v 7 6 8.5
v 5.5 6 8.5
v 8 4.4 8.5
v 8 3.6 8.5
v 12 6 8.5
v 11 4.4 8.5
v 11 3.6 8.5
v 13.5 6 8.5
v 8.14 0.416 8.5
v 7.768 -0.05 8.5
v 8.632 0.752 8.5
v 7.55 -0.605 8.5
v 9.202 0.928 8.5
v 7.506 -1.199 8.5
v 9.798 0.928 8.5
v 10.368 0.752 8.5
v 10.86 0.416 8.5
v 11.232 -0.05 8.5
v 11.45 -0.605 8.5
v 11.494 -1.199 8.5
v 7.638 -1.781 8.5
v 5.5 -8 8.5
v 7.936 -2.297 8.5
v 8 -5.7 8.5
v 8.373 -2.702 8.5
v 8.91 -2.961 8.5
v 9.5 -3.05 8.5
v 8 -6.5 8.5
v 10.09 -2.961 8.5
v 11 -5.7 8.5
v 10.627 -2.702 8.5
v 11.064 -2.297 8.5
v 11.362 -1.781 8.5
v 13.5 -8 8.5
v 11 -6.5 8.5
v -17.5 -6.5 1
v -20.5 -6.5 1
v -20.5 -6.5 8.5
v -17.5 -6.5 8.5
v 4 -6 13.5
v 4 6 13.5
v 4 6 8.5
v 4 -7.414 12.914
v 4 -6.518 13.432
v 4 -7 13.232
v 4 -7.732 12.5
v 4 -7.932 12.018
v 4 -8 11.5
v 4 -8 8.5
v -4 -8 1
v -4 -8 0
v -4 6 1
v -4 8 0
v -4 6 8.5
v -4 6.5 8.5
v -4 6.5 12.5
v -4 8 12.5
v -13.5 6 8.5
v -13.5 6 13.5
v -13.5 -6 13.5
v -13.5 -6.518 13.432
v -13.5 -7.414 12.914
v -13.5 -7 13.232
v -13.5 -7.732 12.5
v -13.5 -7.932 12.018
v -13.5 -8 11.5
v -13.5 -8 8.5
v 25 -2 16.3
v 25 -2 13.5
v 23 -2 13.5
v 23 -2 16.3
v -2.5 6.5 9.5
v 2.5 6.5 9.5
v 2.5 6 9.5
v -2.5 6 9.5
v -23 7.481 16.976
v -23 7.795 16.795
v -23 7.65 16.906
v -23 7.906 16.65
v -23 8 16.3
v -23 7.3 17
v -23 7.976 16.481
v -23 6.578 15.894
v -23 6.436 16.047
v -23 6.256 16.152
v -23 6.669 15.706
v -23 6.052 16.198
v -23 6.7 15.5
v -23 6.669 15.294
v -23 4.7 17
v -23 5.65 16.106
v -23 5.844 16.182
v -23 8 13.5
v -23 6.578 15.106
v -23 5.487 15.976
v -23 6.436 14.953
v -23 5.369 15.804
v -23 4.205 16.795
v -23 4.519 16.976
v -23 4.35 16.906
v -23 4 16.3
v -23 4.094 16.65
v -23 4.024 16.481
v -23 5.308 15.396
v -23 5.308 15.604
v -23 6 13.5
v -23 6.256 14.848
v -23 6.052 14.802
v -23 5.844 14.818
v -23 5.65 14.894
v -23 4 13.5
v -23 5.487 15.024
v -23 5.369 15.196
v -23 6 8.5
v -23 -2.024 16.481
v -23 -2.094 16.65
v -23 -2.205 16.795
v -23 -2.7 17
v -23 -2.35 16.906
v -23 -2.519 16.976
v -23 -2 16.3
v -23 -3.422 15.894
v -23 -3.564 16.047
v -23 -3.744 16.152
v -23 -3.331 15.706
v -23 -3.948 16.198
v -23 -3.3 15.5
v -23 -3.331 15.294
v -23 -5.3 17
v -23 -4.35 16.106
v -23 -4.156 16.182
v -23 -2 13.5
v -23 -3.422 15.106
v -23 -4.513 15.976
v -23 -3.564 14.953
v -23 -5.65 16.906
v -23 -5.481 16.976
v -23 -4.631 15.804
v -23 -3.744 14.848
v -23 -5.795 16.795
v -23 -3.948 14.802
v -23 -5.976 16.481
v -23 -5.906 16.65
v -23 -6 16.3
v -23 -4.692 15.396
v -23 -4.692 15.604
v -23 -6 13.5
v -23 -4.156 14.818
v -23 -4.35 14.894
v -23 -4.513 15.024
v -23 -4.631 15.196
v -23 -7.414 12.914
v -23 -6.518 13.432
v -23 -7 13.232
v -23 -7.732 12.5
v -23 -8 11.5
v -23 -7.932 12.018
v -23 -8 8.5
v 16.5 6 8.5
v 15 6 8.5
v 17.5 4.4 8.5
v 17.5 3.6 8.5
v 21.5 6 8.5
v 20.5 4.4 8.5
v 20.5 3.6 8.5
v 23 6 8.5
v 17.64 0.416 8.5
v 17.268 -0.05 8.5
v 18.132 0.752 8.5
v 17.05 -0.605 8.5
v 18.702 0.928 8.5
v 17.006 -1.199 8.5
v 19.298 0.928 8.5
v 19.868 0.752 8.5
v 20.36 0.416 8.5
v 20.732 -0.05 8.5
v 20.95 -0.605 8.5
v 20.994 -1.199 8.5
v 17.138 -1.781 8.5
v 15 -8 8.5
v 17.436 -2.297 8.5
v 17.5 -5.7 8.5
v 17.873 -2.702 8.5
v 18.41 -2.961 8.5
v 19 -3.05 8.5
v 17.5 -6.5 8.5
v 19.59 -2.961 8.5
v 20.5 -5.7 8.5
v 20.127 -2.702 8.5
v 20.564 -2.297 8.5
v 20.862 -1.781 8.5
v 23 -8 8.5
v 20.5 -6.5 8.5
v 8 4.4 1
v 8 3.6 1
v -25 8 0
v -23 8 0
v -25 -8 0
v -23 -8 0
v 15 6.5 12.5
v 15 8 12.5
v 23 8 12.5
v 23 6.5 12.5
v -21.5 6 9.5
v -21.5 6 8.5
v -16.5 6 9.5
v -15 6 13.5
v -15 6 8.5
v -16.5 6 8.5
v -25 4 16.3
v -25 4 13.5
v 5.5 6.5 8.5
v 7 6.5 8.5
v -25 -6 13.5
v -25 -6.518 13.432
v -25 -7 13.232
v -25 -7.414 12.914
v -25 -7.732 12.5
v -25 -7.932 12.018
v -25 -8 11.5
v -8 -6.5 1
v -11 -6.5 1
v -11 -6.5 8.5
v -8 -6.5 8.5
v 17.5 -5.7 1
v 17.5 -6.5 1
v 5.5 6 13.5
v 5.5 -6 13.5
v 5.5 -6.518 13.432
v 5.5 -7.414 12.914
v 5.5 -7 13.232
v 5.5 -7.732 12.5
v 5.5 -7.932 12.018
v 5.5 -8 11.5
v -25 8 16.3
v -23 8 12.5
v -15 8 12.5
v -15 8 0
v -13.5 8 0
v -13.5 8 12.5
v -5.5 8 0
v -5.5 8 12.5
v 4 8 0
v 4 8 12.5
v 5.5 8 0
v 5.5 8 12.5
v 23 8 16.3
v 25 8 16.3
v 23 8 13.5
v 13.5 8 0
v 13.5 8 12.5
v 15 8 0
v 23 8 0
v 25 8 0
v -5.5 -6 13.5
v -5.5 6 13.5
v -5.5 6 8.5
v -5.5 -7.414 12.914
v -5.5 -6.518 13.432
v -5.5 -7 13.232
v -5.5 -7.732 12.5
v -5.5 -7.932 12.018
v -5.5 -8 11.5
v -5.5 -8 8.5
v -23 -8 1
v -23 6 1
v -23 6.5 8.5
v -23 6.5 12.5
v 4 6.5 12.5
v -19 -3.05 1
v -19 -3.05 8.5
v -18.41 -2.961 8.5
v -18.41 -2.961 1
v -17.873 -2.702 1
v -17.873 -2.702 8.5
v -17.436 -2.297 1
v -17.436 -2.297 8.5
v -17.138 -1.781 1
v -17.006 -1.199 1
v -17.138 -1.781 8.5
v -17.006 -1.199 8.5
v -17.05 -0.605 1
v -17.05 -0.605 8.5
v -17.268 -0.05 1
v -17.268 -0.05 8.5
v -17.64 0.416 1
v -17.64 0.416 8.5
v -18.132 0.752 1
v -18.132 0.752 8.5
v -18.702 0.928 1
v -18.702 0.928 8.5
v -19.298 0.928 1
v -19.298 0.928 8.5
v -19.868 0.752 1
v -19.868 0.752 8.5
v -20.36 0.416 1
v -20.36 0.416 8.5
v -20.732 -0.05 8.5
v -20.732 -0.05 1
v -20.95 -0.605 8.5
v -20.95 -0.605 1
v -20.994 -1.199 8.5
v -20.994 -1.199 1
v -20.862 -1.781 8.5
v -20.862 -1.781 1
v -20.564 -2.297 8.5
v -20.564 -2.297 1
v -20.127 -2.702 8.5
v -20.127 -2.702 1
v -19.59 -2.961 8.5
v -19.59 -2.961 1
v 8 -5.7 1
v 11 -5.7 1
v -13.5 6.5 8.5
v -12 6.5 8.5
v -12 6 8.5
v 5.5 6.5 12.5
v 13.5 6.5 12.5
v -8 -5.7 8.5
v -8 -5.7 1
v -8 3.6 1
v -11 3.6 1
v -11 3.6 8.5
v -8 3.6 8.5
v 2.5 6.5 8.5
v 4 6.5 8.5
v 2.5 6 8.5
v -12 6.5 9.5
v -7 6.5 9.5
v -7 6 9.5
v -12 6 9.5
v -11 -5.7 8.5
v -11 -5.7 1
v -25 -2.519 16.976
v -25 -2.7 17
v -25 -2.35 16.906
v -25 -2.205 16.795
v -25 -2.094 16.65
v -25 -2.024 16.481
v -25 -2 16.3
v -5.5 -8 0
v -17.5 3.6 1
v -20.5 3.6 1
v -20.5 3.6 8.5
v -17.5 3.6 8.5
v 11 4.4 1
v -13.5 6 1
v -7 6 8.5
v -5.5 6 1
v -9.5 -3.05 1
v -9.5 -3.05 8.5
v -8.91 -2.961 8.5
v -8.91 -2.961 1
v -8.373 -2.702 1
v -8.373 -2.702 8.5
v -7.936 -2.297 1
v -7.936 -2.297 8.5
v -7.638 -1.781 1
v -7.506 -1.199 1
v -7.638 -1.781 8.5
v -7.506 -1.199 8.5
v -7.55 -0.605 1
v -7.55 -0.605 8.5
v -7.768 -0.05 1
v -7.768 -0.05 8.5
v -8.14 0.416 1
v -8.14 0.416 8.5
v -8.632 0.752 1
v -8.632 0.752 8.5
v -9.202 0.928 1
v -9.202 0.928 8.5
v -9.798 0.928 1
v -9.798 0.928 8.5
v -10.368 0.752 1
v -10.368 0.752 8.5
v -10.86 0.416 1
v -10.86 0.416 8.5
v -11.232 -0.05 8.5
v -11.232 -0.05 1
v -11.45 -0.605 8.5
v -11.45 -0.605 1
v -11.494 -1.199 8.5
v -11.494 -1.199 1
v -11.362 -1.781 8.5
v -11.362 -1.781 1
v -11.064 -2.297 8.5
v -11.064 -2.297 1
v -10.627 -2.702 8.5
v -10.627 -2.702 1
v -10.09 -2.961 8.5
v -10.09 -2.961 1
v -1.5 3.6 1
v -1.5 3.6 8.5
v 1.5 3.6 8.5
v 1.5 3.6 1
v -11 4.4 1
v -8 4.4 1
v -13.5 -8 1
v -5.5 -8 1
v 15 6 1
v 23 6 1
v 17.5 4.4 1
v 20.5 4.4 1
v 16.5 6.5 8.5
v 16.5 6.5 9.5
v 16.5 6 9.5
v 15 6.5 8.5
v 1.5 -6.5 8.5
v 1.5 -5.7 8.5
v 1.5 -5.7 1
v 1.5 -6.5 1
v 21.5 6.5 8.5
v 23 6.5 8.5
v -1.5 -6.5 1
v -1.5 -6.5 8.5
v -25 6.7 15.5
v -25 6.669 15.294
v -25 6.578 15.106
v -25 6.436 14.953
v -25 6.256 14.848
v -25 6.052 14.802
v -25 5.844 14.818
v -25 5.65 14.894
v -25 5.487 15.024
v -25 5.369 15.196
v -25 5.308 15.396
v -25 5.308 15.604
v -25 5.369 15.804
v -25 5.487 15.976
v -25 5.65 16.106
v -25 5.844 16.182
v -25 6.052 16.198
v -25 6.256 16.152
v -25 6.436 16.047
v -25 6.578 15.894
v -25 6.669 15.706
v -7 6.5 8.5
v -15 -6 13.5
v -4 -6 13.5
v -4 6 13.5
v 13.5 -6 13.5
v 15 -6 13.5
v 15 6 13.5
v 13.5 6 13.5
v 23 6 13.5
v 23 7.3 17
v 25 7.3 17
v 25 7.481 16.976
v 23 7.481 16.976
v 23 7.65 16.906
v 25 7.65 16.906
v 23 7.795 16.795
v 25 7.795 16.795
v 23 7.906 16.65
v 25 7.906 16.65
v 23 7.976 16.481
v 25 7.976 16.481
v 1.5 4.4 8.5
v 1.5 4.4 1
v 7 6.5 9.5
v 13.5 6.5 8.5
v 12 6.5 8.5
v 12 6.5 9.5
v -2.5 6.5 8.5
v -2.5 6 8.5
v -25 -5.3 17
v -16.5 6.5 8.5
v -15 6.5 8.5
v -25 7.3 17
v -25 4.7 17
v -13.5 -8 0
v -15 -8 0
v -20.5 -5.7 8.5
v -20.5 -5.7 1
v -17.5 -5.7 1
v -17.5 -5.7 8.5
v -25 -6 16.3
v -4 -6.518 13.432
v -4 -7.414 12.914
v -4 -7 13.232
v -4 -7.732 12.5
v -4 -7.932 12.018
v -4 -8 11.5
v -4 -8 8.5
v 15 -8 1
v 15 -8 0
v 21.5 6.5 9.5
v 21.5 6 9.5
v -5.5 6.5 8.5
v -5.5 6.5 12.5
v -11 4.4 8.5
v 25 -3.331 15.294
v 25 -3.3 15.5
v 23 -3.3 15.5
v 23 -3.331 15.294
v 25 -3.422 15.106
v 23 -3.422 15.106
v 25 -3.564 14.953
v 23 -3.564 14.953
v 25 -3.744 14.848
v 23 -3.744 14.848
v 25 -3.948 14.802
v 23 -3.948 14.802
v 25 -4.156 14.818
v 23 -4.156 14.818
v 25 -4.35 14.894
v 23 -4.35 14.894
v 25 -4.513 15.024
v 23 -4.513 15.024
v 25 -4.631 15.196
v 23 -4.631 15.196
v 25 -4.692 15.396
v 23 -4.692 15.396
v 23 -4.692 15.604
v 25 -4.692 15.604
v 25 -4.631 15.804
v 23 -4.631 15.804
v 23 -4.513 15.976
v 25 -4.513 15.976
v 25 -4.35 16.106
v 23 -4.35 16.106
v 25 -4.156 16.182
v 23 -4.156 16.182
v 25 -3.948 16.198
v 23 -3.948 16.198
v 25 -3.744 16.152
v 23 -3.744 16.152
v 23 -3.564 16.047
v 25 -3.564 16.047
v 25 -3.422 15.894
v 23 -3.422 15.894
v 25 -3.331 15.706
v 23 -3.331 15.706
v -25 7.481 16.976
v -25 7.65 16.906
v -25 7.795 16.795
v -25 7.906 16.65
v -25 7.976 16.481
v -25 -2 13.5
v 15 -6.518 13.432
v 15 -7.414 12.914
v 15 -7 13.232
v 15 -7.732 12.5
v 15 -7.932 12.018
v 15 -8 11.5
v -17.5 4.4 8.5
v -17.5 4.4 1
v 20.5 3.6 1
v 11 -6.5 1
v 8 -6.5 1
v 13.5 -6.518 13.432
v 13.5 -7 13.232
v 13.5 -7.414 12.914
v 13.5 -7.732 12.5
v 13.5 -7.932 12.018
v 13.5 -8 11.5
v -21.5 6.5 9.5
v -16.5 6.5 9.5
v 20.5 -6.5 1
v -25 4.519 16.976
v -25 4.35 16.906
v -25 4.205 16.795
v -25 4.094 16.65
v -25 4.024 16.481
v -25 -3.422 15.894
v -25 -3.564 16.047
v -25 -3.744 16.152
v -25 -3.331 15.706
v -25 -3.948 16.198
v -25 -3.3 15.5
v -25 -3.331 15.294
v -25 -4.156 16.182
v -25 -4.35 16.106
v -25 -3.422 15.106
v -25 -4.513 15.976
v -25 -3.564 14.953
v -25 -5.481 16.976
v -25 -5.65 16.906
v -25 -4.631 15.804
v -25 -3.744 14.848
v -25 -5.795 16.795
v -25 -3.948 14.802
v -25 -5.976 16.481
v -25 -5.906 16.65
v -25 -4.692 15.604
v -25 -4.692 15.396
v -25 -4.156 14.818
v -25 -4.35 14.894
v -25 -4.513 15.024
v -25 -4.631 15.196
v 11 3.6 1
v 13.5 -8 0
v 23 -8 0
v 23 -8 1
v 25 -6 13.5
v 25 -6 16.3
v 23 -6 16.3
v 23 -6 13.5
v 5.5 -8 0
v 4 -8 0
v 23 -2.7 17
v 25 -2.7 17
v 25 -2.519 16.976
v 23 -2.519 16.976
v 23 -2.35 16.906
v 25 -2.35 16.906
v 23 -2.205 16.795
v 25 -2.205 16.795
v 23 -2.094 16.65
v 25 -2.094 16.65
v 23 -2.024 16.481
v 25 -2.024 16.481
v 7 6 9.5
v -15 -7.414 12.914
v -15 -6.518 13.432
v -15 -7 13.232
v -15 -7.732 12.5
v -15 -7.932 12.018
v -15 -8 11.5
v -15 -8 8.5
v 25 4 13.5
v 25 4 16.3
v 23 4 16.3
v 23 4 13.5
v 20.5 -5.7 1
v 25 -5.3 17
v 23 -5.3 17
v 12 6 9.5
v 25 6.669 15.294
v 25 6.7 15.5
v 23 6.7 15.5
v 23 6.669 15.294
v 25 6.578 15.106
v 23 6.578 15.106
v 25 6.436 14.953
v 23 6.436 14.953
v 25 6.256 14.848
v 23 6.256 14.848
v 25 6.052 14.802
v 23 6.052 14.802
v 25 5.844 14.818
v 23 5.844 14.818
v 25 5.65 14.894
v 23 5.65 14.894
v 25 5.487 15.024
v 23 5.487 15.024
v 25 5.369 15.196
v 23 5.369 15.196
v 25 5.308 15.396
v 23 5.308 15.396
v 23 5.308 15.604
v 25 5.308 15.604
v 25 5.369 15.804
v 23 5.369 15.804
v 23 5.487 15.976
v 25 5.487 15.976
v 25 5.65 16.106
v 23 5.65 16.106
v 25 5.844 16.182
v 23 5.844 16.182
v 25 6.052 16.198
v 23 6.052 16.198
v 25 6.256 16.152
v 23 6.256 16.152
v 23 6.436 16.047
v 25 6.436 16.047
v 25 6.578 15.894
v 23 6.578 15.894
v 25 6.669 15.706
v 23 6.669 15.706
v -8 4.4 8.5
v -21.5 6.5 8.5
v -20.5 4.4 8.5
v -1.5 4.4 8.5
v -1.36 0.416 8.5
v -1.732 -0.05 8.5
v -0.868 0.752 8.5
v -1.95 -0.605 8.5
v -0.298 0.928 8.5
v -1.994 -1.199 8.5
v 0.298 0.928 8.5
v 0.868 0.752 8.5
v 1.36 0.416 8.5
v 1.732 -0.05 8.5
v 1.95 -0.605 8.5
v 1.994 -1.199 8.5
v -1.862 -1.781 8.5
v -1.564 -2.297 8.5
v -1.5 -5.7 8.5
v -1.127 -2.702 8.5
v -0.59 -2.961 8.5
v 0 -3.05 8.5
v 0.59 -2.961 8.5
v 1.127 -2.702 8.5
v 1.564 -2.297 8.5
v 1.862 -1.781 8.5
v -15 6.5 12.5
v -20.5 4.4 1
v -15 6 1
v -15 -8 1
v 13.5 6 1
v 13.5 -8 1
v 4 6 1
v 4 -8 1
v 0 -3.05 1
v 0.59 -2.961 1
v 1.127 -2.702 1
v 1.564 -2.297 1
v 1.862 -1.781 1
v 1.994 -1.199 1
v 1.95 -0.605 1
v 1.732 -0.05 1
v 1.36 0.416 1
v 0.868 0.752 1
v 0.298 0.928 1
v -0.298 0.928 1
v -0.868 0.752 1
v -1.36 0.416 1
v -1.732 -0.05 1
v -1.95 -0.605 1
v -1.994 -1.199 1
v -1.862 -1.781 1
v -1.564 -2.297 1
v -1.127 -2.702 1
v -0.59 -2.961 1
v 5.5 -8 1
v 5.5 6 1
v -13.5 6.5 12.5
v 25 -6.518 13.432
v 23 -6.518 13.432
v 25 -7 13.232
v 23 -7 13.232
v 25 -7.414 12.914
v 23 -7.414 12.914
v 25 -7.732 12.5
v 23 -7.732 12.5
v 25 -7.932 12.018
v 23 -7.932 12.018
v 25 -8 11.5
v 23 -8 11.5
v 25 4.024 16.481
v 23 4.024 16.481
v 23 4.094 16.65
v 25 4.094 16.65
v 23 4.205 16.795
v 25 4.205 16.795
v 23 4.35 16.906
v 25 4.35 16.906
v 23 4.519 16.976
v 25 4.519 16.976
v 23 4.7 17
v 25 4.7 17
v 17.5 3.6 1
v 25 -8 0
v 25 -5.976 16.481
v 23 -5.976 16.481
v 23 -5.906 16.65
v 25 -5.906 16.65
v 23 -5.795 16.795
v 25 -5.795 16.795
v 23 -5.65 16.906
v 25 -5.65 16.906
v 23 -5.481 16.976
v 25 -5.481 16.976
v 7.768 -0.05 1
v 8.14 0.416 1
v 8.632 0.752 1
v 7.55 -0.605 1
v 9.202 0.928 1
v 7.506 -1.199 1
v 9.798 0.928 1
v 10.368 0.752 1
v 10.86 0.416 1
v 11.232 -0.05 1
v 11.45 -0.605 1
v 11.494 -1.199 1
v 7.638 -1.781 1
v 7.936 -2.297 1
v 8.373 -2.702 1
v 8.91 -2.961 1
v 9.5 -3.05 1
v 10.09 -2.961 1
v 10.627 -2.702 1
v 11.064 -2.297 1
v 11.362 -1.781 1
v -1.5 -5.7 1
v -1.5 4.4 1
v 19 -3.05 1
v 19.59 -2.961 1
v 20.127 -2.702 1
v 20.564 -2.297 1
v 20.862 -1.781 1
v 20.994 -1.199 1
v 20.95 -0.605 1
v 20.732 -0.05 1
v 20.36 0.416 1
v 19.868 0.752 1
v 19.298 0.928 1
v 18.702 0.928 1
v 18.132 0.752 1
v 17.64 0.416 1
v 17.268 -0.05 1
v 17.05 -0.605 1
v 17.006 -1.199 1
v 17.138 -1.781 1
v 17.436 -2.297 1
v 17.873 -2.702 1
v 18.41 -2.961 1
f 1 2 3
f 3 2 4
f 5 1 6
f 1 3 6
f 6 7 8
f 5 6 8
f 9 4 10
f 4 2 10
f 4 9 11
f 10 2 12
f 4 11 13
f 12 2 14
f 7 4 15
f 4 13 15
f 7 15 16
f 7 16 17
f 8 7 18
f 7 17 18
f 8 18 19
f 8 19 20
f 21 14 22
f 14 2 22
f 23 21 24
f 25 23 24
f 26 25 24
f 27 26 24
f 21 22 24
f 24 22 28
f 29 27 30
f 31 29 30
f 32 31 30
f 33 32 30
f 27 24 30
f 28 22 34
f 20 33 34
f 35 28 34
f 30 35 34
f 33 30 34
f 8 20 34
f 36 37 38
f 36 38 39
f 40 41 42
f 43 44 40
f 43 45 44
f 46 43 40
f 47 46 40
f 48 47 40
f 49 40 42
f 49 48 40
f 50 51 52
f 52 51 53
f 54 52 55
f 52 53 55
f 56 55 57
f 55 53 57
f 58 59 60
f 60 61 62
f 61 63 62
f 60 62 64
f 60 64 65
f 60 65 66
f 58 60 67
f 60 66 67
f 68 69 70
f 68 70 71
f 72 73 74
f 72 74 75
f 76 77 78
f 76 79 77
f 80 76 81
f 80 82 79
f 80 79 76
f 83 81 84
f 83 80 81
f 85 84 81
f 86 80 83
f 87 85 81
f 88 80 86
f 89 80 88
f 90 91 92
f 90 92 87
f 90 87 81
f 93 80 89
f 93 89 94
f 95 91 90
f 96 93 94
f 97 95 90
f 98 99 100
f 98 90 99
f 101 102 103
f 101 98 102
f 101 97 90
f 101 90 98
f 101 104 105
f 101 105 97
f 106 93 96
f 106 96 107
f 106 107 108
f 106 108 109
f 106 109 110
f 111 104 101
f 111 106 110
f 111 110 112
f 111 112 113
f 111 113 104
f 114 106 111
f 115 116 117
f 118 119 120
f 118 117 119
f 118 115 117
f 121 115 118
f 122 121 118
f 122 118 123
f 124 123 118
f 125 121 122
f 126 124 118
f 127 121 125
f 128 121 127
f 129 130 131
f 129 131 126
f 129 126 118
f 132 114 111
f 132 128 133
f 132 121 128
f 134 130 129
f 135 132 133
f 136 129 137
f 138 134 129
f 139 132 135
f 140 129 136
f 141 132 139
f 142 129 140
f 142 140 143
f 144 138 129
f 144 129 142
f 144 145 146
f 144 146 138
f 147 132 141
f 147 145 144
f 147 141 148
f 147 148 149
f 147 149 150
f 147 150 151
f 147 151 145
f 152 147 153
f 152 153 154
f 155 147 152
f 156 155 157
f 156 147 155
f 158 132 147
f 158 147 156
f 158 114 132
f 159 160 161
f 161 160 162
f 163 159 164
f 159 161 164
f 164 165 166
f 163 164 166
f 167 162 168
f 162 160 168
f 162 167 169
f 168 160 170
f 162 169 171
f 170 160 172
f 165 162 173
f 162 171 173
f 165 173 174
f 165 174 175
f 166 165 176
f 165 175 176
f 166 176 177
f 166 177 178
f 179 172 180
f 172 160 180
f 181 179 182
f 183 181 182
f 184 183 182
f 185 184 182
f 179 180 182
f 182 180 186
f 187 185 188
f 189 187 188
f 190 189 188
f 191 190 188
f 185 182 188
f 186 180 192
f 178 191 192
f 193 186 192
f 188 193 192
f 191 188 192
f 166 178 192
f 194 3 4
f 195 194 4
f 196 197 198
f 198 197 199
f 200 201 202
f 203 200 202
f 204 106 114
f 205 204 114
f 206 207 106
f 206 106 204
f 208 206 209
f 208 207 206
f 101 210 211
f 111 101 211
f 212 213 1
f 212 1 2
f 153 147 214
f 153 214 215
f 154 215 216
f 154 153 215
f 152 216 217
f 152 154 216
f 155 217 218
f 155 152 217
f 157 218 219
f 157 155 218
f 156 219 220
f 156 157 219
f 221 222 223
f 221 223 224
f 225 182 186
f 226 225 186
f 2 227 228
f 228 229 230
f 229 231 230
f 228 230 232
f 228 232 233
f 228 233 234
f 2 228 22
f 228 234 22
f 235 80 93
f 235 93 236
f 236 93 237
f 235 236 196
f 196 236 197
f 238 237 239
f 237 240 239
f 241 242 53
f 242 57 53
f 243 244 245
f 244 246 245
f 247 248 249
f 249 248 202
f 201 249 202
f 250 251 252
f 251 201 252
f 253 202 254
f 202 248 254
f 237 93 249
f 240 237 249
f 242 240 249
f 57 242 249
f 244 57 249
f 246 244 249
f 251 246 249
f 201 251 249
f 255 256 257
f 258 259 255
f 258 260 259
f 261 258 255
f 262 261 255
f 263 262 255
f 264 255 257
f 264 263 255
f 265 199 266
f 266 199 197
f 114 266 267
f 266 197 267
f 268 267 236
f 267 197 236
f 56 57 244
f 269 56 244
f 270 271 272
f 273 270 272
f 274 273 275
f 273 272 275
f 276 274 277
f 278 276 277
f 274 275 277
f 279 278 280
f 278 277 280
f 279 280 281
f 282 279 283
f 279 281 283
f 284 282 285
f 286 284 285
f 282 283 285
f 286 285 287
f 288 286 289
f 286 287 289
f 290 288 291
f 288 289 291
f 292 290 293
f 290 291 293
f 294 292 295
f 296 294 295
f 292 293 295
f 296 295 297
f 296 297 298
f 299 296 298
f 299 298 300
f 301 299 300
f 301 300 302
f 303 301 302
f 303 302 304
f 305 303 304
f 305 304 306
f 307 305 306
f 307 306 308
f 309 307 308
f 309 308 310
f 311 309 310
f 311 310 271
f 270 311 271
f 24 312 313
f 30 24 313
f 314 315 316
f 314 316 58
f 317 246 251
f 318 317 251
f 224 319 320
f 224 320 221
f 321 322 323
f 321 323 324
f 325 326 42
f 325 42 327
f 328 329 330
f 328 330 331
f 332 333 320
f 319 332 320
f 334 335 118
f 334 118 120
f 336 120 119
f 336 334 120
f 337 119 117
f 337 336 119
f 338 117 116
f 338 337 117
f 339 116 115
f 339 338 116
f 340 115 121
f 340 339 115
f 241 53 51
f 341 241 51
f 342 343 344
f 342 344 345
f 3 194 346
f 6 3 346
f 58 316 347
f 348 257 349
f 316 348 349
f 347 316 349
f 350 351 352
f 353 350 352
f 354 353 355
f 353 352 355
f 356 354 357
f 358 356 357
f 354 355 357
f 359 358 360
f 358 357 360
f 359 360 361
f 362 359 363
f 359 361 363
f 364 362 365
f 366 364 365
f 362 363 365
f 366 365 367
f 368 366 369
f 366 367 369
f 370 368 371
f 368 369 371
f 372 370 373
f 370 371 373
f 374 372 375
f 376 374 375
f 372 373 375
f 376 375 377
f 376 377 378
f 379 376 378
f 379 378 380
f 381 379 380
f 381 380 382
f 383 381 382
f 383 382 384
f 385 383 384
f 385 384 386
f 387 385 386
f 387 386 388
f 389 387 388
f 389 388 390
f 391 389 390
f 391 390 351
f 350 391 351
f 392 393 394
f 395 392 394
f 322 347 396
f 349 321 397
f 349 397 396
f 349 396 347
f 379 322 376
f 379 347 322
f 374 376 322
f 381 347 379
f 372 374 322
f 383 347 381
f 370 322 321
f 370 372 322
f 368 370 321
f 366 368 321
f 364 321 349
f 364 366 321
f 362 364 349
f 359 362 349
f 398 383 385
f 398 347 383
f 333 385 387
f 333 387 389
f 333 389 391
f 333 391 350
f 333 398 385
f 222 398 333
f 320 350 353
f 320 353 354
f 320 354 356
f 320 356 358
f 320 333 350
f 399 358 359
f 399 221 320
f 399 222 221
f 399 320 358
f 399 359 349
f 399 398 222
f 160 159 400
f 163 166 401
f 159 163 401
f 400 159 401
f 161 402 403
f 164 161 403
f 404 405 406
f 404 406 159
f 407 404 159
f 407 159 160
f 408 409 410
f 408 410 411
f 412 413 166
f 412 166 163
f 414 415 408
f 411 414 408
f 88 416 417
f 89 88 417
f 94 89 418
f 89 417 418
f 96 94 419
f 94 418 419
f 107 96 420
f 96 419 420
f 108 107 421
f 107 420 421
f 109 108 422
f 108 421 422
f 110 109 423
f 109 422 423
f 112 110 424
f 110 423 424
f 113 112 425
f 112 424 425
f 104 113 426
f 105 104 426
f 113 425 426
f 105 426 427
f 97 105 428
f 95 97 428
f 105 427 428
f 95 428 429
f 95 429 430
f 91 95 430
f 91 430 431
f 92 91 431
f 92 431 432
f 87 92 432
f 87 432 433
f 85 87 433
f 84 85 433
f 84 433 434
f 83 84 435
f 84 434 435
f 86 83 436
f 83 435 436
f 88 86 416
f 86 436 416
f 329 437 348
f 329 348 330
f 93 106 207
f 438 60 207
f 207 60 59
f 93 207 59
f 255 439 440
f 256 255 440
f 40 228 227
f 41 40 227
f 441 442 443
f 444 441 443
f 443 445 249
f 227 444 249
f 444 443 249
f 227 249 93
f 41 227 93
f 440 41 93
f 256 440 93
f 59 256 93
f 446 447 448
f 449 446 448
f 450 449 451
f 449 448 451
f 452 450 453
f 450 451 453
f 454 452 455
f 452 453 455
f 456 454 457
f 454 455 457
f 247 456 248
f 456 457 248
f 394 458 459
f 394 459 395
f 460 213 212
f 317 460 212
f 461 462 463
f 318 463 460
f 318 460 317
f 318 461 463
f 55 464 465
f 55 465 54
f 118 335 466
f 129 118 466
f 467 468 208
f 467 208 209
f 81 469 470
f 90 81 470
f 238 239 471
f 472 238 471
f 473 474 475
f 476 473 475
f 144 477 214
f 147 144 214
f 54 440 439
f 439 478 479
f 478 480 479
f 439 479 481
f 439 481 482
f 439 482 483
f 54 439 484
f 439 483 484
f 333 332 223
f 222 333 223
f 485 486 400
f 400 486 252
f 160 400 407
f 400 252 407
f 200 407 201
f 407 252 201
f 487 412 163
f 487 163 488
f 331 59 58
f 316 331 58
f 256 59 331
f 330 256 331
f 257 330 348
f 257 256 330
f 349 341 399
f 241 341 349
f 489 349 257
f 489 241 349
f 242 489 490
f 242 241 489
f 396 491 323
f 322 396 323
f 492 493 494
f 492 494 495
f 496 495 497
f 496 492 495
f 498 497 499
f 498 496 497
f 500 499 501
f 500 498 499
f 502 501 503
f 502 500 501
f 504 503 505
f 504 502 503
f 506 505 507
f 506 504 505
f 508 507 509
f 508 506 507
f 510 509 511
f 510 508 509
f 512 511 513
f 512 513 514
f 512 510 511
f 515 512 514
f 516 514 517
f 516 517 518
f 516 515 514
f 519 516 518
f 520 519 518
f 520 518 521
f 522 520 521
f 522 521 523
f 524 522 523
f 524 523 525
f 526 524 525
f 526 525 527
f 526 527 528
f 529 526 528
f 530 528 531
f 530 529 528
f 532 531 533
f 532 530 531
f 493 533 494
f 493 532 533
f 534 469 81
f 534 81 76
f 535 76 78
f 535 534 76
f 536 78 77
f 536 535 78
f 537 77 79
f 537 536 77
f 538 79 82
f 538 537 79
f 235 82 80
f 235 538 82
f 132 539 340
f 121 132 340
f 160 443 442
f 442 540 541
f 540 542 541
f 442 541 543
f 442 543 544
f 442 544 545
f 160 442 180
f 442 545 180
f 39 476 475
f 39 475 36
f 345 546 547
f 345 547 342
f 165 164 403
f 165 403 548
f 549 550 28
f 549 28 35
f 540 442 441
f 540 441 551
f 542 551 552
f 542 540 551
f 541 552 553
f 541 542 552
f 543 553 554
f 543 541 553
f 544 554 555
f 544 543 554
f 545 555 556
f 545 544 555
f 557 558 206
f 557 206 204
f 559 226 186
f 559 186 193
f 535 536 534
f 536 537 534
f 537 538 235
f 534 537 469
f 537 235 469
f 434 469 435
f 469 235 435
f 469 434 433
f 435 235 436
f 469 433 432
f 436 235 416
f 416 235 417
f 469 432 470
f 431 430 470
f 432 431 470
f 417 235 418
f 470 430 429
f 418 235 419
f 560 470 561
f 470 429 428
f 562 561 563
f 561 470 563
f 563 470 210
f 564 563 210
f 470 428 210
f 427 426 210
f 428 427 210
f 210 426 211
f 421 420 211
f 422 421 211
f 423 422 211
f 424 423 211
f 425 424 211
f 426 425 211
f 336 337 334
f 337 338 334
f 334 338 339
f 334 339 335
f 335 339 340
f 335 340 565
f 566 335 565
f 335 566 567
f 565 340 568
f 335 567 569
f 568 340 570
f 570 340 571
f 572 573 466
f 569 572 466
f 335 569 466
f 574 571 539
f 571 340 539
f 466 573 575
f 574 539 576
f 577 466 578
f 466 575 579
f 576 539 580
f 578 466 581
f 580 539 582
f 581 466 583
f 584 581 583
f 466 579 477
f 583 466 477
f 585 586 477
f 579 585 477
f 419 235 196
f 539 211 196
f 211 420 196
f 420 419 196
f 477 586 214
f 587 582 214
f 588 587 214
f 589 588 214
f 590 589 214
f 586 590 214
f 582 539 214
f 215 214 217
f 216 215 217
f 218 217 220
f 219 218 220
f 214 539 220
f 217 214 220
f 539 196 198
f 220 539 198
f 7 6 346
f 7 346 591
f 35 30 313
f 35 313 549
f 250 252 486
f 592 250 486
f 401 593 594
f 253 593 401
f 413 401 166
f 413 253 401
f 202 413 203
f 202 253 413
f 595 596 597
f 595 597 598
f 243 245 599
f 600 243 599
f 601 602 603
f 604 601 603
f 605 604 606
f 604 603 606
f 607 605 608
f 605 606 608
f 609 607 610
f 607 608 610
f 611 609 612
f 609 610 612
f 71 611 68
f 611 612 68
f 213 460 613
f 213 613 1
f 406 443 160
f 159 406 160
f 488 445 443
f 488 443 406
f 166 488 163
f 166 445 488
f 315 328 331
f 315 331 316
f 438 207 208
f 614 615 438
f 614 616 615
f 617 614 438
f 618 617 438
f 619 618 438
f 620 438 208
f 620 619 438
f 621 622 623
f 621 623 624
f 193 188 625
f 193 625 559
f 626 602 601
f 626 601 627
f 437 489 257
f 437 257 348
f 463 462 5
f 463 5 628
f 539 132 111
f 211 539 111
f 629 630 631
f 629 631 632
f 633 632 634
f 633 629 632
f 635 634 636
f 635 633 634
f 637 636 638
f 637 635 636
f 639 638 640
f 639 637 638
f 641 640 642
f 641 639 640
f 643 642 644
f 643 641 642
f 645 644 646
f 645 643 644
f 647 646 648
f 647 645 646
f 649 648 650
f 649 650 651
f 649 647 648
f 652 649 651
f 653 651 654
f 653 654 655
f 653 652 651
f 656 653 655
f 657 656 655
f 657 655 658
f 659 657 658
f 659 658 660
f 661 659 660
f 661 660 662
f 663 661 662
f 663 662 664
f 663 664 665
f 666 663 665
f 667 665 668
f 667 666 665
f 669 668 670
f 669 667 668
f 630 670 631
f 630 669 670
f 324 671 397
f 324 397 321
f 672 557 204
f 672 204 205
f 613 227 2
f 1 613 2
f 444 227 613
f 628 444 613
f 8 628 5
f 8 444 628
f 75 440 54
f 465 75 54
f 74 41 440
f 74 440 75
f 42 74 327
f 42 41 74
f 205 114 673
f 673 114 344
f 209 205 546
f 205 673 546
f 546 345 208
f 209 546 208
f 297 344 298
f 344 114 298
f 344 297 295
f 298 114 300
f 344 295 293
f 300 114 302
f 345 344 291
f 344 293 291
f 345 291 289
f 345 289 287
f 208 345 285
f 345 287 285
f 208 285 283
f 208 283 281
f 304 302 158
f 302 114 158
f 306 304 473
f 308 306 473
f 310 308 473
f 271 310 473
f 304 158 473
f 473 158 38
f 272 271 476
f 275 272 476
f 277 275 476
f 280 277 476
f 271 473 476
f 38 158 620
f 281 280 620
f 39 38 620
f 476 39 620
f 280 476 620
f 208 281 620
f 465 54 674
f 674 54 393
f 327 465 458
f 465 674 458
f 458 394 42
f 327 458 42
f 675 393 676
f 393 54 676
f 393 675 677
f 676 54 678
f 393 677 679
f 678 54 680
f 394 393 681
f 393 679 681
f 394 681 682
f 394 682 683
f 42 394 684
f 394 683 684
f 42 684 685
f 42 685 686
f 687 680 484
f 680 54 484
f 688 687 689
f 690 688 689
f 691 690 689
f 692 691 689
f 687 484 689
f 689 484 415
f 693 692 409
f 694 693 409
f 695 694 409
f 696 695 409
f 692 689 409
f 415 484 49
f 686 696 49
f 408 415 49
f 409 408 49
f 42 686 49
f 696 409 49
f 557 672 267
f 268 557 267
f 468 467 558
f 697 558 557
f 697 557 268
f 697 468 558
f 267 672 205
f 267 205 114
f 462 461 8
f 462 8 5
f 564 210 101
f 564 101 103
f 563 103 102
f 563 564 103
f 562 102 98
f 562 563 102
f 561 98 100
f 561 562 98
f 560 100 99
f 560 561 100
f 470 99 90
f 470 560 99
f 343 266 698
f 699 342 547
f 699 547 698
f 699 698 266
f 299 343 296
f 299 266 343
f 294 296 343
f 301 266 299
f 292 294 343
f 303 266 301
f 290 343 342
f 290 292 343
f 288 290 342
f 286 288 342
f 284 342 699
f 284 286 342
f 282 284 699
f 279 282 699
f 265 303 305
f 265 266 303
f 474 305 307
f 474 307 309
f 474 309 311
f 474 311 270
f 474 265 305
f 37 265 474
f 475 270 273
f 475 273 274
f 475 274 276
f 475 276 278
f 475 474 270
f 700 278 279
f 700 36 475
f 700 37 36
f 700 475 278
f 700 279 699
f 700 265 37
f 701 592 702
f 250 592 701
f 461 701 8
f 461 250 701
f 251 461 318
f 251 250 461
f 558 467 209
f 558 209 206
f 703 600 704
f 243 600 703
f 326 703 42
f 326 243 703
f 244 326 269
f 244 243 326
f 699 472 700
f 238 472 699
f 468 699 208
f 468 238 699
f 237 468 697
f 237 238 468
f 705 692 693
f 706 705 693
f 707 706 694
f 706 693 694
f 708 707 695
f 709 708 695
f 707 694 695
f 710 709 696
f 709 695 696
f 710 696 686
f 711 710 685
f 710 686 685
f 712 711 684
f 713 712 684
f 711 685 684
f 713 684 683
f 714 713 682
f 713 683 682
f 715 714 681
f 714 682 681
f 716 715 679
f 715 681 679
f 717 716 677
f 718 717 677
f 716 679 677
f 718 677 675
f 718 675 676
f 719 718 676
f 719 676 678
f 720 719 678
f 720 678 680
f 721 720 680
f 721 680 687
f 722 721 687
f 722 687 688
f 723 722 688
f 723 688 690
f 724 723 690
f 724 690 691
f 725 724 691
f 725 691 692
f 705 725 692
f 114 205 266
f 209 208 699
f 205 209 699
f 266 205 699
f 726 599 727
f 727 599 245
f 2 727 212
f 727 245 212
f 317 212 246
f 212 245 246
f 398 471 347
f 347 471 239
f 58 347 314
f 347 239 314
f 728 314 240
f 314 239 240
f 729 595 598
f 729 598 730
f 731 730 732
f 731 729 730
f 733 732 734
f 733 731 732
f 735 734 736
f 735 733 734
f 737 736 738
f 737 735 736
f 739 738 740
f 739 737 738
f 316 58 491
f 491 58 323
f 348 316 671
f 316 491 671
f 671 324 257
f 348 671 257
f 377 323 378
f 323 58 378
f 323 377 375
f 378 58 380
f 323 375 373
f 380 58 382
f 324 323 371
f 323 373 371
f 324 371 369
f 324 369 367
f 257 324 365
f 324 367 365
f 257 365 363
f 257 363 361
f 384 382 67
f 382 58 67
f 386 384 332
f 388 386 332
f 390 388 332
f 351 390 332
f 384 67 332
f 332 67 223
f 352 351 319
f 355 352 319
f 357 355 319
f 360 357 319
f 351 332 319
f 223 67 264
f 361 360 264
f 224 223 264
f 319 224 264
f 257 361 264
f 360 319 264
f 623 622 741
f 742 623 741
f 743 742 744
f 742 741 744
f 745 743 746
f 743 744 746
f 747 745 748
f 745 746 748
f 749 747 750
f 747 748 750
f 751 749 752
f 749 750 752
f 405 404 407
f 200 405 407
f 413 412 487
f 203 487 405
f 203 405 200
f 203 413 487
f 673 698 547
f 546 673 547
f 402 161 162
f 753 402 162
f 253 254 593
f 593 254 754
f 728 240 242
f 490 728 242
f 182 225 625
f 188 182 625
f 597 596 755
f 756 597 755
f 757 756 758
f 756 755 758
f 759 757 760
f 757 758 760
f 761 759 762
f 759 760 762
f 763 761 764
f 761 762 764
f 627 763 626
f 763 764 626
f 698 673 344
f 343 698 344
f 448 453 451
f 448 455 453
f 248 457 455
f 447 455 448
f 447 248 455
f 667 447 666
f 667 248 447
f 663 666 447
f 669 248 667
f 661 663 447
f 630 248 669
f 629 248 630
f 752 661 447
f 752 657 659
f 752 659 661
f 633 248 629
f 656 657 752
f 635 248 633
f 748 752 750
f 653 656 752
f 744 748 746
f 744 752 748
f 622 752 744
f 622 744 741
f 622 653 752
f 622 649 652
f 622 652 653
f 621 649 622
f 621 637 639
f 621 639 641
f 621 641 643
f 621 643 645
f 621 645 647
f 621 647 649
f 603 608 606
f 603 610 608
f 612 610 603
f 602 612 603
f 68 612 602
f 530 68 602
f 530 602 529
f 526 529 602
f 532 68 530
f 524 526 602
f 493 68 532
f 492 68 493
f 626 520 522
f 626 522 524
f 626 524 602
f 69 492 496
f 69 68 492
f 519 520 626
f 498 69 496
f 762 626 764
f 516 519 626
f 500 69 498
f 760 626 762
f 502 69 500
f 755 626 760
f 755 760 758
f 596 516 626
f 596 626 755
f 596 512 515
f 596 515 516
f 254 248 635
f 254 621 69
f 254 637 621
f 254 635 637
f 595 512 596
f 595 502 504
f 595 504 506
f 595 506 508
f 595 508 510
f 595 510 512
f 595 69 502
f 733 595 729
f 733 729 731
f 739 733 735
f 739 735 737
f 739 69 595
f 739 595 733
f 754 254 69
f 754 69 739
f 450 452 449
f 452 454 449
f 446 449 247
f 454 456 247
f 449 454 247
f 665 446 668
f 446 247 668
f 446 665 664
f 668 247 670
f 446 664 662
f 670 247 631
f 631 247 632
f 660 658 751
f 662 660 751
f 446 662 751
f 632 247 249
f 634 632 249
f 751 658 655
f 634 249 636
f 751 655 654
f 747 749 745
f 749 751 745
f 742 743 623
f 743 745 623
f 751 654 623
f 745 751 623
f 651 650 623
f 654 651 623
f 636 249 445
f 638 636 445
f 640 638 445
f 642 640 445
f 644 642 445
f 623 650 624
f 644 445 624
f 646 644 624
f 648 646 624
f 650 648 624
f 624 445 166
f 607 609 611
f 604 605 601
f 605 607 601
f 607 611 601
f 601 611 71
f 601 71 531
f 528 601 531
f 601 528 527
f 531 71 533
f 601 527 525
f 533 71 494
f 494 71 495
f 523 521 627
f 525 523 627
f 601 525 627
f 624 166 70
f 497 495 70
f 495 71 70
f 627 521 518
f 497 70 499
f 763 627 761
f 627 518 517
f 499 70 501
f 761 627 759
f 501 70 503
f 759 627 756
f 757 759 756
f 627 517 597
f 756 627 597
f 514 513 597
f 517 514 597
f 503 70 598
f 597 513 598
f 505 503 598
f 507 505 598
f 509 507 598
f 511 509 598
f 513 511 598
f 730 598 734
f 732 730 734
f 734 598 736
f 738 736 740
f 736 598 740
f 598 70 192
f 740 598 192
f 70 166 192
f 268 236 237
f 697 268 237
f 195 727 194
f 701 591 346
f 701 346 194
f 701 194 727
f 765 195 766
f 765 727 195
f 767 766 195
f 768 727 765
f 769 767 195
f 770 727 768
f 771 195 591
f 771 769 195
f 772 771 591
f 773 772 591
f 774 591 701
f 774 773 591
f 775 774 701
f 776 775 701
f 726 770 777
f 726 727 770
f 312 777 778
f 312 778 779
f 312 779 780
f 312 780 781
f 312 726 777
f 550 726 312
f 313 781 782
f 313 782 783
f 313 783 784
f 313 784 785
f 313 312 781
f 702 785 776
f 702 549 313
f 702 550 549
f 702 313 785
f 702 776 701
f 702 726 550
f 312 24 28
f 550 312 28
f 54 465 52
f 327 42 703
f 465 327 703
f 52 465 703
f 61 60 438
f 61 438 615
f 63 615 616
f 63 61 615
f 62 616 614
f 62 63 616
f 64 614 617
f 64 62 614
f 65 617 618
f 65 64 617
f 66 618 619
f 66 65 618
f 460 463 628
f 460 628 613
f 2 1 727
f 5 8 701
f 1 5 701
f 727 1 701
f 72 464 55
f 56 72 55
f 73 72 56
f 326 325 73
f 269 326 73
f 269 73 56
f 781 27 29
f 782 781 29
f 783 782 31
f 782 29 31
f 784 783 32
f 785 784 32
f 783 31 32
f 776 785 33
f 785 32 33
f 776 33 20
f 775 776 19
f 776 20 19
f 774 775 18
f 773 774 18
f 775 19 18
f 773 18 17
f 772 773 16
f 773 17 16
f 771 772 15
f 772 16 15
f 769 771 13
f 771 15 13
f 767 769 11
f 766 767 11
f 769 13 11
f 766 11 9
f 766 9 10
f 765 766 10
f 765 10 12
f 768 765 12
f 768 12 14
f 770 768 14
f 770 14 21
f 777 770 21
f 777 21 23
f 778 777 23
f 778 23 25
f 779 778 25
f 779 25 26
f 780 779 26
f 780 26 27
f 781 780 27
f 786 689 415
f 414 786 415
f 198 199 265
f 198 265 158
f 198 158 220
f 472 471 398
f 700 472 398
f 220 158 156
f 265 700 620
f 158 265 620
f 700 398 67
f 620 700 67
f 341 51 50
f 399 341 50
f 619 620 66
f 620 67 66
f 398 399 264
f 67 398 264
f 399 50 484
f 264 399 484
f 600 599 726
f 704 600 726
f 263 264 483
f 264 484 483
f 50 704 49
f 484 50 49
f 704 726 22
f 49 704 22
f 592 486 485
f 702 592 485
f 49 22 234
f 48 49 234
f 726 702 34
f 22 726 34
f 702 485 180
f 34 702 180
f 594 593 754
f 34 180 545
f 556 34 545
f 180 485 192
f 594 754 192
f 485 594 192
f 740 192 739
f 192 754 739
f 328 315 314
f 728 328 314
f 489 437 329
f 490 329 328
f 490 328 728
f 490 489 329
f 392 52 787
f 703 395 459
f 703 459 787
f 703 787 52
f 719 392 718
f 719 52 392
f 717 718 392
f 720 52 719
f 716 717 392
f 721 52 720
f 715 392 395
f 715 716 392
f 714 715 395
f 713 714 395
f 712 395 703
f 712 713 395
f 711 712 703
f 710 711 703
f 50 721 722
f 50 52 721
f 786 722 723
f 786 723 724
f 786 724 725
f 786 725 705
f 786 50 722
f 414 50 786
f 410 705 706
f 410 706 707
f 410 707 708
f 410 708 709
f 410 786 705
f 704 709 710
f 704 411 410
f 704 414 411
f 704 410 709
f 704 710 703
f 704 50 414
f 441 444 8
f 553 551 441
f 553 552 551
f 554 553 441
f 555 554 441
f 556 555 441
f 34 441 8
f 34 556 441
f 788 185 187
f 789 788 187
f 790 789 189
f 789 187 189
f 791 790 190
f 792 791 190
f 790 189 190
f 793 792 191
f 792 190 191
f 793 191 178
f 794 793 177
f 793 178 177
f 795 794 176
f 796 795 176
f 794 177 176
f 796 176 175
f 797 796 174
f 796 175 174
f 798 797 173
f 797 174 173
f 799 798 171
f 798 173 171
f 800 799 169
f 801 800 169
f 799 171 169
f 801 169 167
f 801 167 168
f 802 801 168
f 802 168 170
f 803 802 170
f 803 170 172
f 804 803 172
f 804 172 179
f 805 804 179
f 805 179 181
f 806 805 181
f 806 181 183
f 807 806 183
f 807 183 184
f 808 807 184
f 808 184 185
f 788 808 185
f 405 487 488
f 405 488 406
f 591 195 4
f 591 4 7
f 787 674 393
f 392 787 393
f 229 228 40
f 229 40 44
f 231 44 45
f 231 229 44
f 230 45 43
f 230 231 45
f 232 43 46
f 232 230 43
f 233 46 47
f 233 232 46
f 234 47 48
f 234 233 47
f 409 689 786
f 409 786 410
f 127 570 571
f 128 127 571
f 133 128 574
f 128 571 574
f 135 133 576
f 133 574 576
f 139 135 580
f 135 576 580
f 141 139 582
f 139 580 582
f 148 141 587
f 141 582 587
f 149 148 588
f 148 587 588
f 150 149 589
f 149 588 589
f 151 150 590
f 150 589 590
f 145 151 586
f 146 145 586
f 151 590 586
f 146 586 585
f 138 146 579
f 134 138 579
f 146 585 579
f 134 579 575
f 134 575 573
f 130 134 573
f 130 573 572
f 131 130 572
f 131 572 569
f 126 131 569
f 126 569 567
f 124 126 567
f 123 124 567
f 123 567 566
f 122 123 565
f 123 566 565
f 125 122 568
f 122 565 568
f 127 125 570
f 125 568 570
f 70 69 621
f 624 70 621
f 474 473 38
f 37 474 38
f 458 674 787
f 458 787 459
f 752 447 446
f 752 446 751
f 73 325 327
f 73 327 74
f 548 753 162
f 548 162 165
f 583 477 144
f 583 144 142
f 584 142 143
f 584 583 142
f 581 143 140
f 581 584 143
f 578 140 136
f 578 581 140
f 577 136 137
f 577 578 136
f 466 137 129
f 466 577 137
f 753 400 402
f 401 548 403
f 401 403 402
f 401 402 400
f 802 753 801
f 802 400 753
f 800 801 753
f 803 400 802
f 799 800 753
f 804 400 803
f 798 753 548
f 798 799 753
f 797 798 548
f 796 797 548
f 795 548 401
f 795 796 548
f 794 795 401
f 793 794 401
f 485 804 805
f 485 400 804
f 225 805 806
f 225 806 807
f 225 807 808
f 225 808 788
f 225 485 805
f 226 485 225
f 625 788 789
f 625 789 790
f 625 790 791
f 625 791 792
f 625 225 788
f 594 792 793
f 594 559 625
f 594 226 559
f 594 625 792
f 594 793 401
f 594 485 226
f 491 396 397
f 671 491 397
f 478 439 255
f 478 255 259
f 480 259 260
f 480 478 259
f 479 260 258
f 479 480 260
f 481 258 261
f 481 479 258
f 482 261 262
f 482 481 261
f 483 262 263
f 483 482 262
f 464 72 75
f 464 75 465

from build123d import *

# Parameters (mm, degrees)
PAD_DEPTH       = 25
SKETCH001_W     = 1
SKETCH001_H     = 8
SKETCH001_W_2   = 5
POCKET_DEPTH    = 14
SKETCH002_W     = 12.5
SKETCH002_H     = 8
POCKET001_DEPTH = 1.5
POCKET002_DEPTH = 0.5
SKETCH004_R     = 2
SKETCH004_W     = 0.8
SKETCH004_H     = 3
POCKET003_DEPTH = 8
SKETCH005_R     = 0.7
PAD001_DEPTH    = 2
SKETCH006_R     = 0.7
PAD002_DEPTH    = 2


with BuildPart() as part:
    # Sketch → Pad (new body, symmetric)
    with BuildSketch(Plane.YZ):
        with BuildLine():
            Line((-6, 13.5), (8, 13.5))
            Line((8, 13.5), (8, 0))
            Line((8, 0), (-8, 0))
            Line((-8, 0), (-8, 11.5))
            ThreePointArc((-6, 13.5), (-7.414214, 12.914214), (-8, 11.5))
        make_face()
    extrude(amount=PAD_DEPTH, both=True)

    # Sketch001 (on Face4 of Pad) → Pocket (cut)
    with BuildSketch(Plane(origin=(0, -8, 0), x_dir=(0, 0, -1), z_dir=(0, -1, 0))):
        with Locations((-0.5, -19)):
            Rectangle(SKETCH001_W, SKETCH001_H)
        with Locations((-0.5, -9.5)):
            Rectangle(SKETCH001_W, SKETCH001_H)
        with Locations((-0.5, 0)):
            Rectangle(SKETCH001_W, SKETCH001_H)
        with Locations((-0.5, 9.5)):
            Rectangle(SKETCH001_W, SKETCH001_H)
        with Locations((-0.5, 19)):
            Rectangle(SKETCH001_W, SKETCH001_H)
        with Locations((-11, -19)):
            Rectangle(SKETCH001_W_2, SKETCH001_H)
        with Locations((-11, -9.5)):
            Rectangle(SKETCH001_W_2, SKETCH001_H)
        with Locations((-11, 0)):
            Rectangle(SKETCH001_W_2, SKETCH001_H)
        with Locations((-11, 9.5)):
            Rectangle(SKETCH001_W_2, SKETCH001_H)
        with Locations((-11, 19)):
            Rectangle(SKETCH001_W_2, SKETCH001_H)
    extrude(amount=-POCKET_DEPTH, mode=Mode.SUBTRACT)

    # Sketch002 (on Face3 of Pocket) → Pocket001 (cut)
    with BuildSketch(Plane.ZX.offset(8)):
        with Locations((6.25, 19)):
            Rectangle(SKETCH002_W, SKETCH002_H)
        with Locations((6.25, 9.5)):
            Rectangle(SKETCH002_W, SKETCH002_H)
        with Locations((6.25, 0)):
            Rectangle(SKETCH002_W, SKETCH002_H)
        with Locations((6.25, -9.5)):
            Rectangle(SKETCH002_W, SKETCH002_H)
        with Locations((6.25, -19)):
            Rectangle(SKETCH002_W, SKETCH002_H)
    extrude(amount=-POCKET001_DEPTH, mode=Mode.SUBTRACT)

    # Sketch003 (on Face67 of Pocket001) → Pocket002 (cut)
    with BuildSketch(Plane.ZX.offset(6.5)):
        Polygon((0, 23), (8.5, 23), (8.5, 21.5), (9.5, 21.5), (9.5, 16.5), (8.5, 16.5), (8.5, 15), (0, 15), align=None)
        Polygon((0, 13.5), (8.5, 13.5), (8.5, 12), (9.5, 12), (9.5, 7), (8.5, 7), (8.5, 5.5), (0, 5.5), align=None)
        Polygon((0, 4), (8.5, 4), (8.5, 2.5), (9.5, 2.5), (9.5, -2.5), (8.5, -2.5), (8.5, -4), (0, -4), align=None)
        Polygon((0, -5.5), (8.5, -5.5), (8.5, -7), (9.5, -7), (9.5, -12), (8.5, -12), (8.5, -13.5), (0, -13.5), align=None)
        Polygon((0, -15), (8.5, -15), (8.5, -16.5), (9.5, -16.5), (9.5, -21.5), (8.5, -21.5), (8.5, -23), (0, -23), align=None)
    extrude(amount=-POCKET002_DEPTH, mode=Mode.SUBTRACT)

    # Sketch004 (on Face64 of Pocket002) → Pocket003 (cut)
    with BuildSketch(Plane(origin=(0, 0, 8.5), x_dir=(0, -1, 0), z_dir=(0, 0, 1))):
        with Locations((1.05, -19)):
            Circle(SKETCH004_R)
        with Locations((1.05, -9.5)):
            Circle(SKETCH004_R)
        with Locations((1.05, 0)):
            Circle(SKETCH004_R)
        with Locations((1.05, 9.5)):
            Circle(SKETCH004_R)
        with Locations((1.05, 19)):
            Circle(SKETCH004_R)
        with Locations((-4, -19)):
            Rectangle(SKETCH004_W, SKETCH004_H)
        with Locations((-4, -9.5)):
            Rectangle(SKETCH004_W, SKETCH004_H)
        with Locations((-4, 0)):
            Rectangle(SKETCH004_W, SKETCH004_H)
        with Locations((-4, 9.5)):
            Rectangle(SKETCH004_W, SKETCH004_H)
        with Locations((-4, 19)):
            Rectangle(SKETCH004_W, SKETCH004_H)
        with Locations((6.1, -19)):
            Rectangle(SKETCH004_W, SKETCH004_H)
        with Locations((6.1, -9.5)):
            Rectangle(SKETCH004_W, SKETCH004_H)
        with Locations((6.1, 0)):
            Rectangle(SKETCH004_W, SKETCH004_H)
        with Locations((6.1, 9.5)):
            Rectangle(SKETCH004_W, SKETCH004_H)
        with Locations((6.1, 19)):
            Rectangle(SKETCH004_W, SKETCH004_H)
    extrude(amount=-POCKET003_DEPTH, mode=Mode.SUBTRACT)

    # Sketch005 (on Face2 of Pocket003) → Pad001 (join)
    with BuildSketch(Plane(origin=(-25, 0, 0), x_dir=(0, 1, 0), z_dir=(-1, 0, 0))):
        with BuildLine():
            Line((-6, -13.5), (-2, -13.5))
            Line((-2, -13.5), (-2, -16.3))
            ThreePointArc((-2.7, -17), (-2.205025, -16.794975), (-2, -16.3))
            Line((-2.7, -17), (-5.3, -17))
            ThreePointArc((-6, -16.3), (-5.794975, -16.794975), (-5.3, -17))
            Line((-6, -16.3), (-6, -13.5))
        make_face()
        with Locations((-4, -15.5)):
            Circle(SKETCH005_R, mode=Mode.SUBTRACT)
        with BuildLine():
            Line((4, -13.5), (8, -13.5))
            Line((8, -13.5), (8, -16.3))
            ThreePointArc((7.3, -17), (7.794975, -16.794975), (8, -16.3))
            Line((7.3, -17), (4.7, -17))
            ThreePointArc((4, -16.3), (4.205025, -16.794975), (4.7, -17))
            Line((4, -16.3), (4, -13.5))
        make_face()
        with Locations((6, -15.5)):
            Circle(SKETCH005_R, mode=Mode.SUBTRACT)
    extrude(amount=-PAD001_DEPTH)

    # Sketch006 (on Face4 of Pocket003) → Pad002 (join)
    with BuildSketch(Plane(origin=(25, 0, 0), x_dir=(0, 1, 0), z_dir=(-1, 0, 0))):
        with BuildLine():
            Line((-6, -13.5), (-2, -13.5))
            Line((-2, -13.5), (-2, -16.3))
            ThreePointArc((-2.7, -17), (-2.205025, -16.794975), (-2, -16.3))
            Line((-2.7, -17), (-5.3, -17))
            ThreePointArc((-6, -16.3), (-5.794975, -16.794975), (-5.3, -17))
            Line((-6, -16.3), (-6, -13.5))
        make_face()
        with Locations((-4, -15.5)):
            Circle(SKETCH006_R, mode=Mode.SUBTRACT)
        with BuildLine():
            Line((4, -13.5), (8, -13.5))
            Line((8, -13.5), (8, -16.3))
            ThreePointArc((7.3, -17), (7.794975, -16.794975), (8, -16.3))
            Line((7.3, -17), (4.7, -17))
            ThreePointArc((4, -16.3), (4.205025, -16.794975), (4.7, -17))
            Line((4, -16.3), (4, -13.5))
        make_face()
        with Locations((6, -15.5)):
            Circle(SKETCH006_R, mode=Mode.SUBTRACT)
    extrude(amount=PAD002_DEPTH)


solid = part.part
